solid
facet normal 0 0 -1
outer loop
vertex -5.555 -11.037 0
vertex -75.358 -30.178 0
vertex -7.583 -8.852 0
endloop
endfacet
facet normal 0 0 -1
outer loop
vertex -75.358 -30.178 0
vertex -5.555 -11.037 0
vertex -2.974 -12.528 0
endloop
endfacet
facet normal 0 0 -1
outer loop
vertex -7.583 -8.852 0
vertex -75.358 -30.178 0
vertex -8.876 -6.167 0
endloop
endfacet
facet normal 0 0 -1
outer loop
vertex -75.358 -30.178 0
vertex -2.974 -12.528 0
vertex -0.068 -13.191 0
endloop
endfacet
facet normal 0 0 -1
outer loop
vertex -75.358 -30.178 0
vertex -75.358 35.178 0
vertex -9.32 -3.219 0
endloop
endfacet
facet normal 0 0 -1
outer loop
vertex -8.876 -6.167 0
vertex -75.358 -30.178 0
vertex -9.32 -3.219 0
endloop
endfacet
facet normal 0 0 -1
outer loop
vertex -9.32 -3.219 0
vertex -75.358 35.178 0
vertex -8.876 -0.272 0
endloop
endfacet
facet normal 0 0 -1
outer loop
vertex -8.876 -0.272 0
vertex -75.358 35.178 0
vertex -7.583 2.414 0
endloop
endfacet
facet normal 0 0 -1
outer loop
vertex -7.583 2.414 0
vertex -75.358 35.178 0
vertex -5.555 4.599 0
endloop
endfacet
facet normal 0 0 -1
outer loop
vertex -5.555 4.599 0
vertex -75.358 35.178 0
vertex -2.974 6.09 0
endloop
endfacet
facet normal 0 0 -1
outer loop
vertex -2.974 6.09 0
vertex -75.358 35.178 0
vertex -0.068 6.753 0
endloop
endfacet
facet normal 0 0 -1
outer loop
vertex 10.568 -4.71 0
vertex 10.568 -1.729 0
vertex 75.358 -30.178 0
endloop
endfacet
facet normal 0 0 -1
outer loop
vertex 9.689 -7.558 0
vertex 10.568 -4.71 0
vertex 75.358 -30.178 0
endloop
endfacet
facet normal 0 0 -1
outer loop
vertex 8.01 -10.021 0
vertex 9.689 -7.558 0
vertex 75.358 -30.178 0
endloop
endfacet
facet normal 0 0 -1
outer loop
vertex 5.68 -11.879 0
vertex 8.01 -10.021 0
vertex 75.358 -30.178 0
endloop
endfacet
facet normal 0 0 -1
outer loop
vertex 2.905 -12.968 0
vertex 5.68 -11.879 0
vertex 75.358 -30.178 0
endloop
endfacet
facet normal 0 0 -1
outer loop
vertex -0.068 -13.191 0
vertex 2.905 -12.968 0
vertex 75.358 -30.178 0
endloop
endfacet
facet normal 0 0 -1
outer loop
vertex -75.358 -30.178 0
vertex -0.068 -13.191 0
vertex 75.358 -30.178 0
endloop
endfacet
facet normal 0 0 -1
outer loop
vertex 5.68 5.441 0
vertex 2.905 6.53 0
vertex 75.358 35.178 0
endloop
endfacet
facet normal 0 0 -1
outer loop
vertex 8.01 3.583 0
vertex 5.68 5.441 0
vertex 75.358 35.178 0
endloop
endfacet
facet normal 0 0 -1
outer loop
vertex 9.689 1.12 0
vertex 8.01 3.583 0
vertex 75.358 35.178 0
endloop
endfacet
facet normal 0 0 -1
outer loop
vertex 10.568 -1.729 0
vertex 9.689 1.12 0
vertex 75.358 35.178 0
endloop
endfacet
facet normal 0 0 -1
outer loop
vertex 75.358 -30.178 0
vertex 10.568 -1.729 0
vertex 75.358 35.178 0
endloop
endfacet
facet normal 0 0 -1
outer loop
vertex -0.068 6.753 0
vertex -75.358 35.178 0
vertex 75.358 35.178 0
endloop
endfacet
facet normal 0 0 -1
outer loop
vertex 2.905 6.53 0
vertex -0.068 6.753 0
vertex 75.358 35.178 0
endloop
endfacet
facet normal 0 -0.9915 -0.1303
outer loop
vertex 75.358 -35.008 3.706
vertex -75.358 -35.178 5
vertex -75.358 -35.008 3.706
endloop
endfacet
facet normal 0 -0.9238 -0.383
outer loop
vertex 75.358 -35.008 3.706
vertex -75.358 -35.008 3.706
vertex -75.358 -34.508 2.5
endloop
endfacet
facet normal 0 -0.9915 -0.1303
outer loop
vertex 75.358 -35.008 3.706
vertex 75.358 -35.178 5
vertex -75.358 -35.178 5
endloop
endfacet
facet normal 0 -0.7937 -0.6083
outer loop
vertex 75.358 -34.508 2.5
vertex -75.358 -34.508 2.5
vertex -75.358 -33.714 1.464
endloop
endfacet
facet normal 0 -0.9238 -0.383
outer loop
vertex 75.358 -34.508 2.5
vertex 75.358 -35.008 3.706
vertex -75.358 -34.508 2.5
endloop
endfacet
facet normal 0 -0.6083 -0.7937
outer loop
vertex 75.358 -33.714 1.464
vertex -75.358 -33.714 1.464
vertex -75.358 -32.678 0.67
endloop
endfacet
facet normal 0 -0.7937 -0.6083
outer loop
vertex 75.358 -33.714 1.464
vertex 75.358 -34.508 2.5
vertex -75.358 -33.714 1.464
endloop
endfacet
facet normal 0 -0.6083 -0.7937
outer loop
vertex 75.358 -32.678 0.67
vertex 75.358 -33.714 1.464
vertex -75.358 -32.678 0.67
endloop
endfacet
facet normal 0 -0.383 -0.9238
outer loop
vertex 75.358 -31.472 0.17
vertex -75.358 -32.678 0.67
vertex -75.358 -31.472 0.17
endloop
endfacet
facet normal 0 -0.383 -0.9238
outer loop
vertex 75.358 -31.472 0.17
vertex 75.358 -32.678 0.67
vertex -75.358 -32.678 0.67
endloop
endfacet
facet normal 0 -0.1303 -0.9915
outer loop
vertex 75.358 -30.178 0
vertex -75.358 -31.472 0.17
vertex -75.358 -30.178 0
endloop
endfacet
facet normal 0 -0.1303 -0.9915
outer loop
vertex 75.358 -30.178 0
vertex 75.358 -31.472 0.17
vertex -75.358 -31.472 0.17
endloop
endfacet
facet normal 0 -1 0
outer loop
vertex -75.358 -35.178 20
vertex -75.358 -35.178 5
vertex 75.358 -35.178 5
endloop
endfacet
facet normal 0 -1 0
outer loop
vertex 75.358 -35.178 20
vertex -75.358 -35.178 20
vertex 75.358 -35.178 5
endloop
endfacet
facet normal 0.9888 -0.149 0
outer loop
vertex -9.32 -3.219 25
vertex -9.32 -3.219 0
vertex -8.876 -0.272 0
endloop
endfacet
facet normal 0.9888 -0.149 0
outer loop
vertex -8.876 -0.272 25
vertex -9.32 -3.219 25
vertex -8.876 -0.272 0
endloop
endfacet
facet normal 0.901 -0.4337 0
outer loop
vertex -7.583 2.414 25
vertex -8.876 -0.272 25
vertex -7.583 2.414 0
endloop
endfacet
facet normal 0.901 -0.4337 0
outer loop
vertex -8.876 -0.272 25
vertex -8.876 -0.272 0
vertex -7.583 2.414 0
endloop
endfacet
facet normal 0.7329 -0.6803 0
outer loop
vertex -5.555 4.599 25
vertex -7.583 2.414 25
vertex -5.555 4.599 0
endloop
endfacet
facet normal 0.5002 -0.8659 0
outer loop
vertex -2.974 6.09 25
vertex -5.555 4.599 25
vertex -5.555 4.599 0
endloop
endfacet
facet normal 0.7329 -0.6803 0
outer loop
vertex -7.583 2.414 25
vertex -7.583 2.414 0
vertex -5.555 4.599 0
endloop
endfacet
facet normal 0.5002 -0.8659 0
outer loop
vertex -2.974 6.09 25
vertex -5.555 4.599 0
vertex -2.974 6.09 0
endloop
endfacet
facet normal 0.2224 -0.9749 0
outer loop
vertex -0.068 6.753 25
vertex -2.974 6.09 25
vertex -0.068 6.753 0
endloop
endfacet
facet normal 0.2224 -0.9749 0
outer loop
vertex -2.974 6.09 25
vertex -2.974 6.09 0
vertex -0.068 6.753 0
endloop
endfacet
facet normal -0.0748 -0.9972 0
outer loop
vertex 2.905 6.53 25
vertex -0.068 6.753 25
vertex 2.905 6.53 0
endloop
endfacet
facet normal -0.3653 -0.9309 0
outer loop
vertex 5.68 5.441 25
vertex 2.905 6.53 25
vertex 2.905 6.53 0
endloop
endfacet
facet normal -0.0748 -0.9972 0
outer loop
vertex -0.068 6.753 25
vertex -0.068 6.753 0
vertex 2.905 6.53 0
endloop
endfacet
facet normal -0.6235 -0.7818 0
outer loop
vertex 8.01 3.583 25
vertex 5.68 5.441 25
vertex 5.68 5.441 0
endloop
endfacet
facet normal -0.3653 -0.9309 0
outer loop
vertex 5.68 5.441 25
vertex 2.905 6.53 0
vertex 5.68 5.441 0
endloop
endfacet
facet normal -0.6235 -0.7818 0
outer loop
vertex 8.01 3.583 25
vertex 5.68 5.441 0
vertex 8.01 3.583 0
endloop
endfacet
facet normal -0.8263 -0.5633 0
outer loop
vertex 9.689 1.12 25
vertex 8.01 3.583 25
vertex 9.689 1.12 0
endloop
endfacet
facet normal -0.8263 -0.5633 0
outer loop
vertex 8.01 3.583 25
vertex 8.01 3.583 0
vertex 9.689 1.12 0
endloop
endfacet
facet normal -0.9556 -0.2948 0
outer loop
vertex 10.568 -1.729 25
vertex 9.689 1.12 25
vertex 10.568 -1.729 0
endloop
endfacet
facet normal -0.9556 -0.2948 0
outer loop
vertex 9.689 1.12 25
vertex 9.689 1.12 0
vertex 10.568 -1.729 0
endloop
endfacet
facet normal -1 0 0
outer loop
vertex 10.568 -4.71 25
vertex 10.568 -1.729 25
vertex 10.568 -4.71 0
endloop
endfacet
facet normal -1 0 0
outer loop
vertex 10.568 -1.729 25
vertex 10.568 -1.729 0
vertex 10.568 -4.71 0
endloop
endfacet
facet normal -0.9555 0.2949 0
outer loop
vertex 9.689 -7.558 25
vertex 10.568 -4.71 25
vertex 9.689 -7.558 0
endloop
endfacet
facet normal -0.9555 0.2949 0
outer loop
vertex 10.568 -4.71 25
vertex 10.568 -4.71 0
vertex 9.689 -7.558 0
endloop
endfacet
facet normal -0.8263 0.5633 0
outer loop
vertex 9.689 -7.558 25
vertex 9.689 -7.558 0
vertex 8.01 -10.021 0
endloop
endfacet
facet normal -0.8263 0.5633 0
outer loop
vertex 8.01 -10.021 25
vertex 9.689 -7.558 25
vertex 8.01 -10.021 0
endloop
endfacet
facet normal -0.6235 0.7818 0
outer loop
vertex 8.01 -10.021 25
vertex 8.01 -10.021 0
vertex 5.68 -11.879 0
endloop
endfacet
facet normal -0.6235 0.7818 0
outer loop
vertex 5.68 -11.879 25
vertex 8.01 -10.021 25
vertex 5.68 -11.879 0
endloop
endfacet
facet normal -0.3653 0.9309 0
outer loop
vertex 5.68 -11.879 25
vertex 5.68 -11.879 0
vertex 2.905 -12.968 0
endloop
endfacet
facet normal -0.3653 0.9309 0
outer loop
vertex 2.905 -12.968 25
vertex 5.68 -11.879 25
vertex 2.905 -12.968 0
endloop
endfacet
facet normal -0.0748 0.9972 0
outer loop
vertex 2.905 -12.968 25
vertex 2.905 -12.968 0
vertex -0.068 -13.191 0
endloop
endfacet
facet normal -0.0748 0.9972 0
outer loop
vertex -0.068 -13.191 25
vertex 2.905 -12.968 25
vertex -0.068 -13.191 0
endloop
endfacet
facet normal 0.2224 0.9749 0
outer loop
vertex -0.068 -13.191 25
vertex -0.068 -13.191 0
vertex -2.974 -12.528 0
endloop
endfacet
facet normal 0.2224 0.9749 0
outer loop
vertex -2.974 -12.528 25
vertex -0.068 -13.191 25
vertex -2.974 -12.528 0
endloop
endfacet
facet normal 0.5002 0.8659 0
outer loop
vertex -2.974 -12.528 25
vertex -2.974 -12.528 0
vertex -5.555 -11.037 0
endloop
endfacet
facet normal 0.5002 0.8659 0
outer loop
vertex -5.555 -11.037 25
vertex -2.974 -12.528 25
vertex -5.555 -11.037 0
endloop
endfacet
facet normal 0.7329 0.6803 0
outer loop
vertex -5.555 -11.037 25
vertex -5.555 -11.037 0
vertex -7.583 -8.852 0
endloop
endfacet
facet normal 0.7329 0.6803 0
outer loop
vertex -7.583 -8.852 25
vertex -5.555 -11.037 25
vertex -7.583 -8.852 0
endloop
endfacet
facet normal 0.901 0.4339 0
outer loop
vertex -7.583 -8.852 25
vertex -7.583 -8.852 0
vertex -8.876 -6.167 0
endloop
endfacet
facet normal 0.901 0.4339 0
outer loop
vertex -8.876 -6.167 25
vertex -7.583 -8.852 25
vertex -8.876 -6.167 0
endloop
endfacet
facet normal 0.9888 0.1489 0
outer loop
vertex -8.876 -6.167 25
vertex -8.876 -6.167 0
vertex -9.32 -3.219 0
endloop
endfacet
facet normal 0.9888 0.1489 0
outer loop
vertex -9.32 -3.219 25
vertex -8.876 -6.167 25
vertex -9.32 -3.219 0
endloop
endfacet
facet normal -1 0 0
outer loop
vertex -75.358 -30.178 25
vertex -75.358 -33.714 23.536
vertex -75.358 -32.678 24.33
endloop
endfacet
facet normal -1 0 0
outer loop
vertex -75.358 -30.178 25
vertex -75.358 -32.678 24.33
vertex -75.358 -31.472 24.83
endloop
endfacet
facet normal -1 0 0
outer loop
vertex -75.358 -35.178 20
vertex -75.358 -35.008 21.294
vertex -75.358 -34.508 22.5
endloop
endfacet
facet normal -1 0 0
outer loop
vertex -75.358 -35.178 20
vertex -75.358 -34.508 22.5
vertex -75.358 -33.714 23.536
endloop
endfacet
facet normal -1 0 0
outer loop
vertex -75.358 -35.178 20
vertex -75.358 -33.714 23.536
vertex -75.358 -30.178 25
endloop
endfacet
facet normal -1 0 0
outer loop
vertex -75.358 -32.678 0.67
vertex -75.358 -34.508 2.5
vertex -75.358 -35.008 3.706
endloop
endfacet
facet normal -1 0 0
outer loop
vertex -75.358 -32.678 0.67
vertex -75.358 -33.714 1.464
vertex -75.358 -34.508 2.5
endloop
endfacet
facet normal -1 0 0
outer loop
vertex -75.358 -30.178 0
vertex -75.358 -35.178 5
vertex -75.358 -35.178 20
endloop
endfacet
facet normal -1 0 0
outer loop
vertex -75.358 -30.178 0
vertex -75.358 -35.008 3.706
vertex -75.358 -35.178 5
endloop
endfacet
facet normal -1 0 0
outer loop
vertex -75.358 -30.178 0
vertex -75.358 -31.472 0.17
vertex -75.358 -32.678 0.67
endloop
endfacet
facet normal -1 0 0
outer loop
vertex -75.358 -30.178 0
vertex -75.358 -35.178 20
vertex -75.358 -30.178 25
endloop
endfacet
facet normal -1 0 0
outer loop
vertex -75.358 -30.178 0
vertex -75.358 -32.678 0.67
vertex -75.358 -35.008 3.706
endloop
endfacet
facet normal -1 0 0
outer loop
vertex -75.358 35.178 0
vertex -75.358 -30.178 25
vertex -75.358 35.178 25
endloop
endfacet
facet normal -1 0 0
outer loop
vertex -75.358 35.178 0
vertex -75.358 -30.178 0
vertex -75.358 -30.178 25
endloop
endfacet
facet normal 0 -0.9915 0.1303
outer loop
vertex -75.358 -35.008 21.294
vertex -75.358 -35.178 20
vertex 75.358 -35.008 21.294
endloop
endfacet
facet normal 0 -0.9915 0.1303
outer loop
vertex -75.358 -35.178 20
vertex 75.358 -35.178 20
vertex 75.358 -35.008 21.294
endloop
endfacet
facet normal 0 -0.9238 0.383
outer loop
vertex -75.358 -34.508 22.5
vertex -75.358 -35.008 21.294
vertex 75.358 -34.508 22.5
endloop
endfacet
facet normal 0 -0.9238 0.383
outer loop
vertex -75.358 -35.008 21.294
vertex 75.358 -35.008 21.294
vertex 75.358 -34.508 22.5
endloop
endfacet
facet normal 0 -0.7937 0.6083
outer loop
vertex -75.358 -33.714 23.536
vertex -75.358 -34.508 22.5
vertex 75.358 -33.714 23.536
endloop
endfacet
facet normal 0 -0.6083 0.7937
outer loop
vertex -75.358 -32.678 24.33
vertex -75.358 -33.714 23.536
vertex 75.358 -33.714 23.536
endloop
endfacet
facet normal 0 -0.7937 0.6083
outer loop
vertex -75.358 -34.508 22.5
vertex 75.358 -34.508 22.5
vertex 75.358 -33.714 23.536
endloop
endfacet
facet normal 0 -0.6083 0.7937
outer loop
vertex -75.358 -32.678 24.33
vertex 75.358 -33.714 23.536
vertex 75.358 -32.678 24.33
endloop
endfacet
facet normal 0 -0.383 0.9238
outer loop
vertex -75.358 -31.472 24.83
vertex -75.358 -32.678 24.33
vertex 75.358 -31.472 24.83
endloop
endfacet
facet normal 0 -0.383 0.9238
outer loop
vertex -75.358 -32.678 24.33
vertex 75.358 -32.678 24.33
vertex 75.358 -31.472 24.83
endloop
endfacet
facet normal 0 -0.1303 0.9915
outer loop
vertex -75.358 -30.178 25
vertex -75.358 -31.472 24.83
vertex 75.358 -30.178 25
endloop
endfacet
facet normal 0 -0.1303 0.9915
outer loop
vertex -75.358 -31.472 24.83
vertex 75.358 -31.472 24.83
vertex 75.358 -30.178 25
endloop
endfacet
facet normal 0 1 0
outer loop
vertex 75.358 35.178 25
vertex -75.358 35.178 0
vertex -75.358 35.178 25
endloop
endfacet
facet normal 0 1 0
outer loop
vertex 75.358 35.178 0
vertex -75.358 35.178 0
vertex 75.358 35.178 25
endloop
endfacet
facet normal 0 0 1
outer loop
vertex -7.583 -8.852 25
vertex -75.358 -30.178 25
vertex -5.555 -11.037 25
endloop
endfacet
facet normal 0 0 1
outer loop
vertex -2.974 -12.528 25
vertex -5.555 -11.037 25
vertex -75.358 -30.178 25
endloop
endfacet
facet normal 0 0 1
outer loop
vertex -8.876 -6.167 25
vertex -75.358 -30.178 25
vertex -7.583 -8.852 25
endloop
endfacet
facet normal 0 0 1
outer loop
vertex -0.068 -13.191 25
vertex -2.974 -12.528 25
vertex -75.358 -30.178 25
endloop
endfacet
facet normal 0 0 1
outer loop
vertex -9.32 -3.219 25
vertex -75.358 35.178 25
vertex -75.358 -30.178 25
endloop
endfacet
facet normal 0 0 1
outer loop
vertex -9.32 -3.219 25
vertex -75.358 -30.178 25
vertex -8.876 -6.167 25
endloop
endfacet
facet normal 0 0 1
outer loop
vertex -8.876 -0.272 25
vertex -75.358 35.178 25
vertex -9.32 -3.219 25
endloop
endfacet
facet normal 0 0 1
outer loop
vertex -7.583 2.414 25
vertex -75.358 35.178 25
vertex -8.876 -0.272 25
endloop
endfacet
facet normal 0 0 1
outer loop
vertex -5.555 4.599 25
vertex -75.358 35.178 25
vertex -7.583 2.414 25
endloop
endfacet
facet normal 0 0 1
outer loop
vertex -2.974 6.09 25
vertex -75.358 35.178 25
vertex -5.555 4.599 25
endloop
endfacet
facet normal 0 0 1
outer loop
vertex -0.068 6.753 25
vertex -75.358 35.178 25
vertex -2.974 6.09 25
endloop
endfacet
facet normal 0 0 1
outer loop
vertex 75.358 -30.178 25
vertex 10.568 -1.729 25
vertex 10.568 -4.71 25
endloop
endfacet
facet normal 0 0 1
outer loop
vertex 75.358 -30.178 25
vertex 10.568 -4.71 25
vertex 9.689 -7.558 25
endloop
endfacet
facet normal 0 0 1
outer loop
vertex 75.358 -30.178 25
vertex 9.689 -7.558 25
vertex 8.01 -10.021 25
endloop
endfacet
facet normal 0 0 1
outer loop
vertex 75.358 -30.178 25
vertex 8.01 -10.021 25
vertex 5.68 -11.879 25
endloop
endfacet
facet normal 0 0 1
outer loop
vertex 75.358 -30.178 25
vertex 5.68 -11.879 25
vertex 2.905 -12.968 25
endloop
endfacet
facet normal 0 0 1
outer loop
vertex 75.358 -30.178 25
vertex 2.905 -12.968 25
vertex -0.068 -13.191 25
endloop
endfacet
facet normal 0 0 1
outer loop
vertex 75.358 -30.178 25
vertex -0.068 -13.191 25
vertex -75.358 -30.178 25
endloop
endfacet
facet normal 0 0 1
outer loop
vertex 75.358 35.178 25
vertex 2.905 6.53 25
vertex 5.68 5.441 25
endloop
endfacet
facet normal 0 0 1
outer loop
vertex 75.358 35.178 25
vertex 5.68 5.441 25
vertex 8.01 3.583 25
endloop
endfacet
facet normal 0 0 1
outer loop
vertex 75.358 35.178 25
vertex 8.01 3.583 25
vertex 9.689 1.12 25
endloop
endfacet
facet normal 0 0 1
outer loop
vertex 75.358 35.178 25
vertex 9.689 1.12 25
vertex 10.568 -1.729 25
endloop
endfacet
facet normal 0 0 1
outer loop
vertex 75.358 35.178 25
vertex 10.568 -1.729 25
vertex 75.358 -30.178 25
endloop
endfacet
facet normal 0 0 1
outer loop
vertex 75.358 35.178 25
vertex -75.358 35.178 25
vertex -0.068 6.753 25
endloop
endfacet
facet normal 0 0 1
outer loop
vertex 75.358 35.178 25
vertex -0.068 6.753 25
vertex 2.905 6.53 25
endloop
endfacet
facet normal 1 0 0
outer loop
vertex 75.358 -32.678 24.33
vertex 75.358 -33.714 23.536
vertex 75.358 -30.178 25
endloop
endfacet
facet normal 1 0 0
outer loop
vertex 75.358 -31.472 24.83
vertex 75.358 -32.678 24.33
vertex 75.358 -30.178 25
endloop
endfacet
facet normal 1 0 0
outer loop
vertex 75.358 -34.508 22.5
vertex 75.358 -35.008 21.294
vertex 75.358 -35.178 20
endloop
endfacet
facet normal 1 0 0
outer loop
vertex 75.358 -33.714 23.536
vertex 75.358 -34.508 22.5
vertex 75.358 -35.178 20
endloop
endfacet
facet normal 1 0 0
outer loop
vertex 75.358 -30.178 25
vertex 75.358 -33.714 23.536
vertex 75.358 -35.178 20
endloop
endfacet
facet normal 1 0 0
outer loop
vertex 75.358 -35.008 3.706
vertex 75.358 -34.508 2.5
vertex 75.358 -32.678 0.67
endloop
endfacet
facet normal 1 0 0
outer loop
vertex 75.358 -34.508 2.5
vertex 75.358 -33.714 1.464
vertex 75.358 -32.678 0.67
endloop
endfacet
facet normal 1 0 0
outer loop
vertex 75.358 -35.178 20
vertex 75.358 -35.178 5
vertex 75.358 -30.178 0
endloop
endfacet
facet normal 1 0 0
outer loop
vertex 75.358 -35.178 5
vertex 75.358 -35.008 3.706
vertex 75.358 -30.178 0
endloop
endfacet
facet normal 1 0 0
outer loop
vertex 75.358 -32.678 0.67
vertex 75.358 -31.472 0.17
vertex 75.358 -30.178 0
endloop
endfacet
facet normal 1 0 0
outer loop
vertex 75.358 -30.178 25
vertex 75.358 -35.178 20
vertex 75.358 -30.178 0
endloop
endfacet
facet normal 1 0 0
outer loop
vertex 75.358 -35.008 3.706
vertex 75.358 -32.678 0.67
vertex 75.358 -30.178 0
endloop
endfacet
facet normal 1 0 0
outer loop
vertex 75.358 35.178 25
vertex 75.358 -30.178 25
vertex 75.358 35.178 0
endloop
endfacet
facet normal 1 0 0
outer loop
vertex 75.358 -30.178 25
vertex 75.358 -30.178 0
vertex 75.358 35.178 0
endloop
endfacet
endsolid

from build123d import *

# Parameters (mm, degrees)
F0_W     = 150.715396
F0_H     = 70.35607
F1_DEPTH = 25
F2_R     = 5
F3_R     = 5
F5_D     = 20


with BuildPart() as f1:
    # F0 (on Top) → F1 (new body)
    with BuildSketch(Plane.XY):
        Rectangle(F0_W, F0_H)
    extrude(amount=F1_DEPTH)

    # F2
    f2_edges = [f1.edges().sort_by_distance(p)[0] for p in [
        (0, -35.178035, 25),
    ]]
    fillet(f2_edges, radius=F2_R)

    # F3
    f3_edges = [f1.edges().sort_by_distance(p)[0] for p in [
        (0, -35.178035, 0),
    ]]
    fillet(f3_edges, radius=F3_R)

    # F5 (through all)
    with Locations(Plane.XY.offset(25)):
        with Locations((0.679701, -3.219078)):
            Hole(F5_D / 2)


solid = f1.part
